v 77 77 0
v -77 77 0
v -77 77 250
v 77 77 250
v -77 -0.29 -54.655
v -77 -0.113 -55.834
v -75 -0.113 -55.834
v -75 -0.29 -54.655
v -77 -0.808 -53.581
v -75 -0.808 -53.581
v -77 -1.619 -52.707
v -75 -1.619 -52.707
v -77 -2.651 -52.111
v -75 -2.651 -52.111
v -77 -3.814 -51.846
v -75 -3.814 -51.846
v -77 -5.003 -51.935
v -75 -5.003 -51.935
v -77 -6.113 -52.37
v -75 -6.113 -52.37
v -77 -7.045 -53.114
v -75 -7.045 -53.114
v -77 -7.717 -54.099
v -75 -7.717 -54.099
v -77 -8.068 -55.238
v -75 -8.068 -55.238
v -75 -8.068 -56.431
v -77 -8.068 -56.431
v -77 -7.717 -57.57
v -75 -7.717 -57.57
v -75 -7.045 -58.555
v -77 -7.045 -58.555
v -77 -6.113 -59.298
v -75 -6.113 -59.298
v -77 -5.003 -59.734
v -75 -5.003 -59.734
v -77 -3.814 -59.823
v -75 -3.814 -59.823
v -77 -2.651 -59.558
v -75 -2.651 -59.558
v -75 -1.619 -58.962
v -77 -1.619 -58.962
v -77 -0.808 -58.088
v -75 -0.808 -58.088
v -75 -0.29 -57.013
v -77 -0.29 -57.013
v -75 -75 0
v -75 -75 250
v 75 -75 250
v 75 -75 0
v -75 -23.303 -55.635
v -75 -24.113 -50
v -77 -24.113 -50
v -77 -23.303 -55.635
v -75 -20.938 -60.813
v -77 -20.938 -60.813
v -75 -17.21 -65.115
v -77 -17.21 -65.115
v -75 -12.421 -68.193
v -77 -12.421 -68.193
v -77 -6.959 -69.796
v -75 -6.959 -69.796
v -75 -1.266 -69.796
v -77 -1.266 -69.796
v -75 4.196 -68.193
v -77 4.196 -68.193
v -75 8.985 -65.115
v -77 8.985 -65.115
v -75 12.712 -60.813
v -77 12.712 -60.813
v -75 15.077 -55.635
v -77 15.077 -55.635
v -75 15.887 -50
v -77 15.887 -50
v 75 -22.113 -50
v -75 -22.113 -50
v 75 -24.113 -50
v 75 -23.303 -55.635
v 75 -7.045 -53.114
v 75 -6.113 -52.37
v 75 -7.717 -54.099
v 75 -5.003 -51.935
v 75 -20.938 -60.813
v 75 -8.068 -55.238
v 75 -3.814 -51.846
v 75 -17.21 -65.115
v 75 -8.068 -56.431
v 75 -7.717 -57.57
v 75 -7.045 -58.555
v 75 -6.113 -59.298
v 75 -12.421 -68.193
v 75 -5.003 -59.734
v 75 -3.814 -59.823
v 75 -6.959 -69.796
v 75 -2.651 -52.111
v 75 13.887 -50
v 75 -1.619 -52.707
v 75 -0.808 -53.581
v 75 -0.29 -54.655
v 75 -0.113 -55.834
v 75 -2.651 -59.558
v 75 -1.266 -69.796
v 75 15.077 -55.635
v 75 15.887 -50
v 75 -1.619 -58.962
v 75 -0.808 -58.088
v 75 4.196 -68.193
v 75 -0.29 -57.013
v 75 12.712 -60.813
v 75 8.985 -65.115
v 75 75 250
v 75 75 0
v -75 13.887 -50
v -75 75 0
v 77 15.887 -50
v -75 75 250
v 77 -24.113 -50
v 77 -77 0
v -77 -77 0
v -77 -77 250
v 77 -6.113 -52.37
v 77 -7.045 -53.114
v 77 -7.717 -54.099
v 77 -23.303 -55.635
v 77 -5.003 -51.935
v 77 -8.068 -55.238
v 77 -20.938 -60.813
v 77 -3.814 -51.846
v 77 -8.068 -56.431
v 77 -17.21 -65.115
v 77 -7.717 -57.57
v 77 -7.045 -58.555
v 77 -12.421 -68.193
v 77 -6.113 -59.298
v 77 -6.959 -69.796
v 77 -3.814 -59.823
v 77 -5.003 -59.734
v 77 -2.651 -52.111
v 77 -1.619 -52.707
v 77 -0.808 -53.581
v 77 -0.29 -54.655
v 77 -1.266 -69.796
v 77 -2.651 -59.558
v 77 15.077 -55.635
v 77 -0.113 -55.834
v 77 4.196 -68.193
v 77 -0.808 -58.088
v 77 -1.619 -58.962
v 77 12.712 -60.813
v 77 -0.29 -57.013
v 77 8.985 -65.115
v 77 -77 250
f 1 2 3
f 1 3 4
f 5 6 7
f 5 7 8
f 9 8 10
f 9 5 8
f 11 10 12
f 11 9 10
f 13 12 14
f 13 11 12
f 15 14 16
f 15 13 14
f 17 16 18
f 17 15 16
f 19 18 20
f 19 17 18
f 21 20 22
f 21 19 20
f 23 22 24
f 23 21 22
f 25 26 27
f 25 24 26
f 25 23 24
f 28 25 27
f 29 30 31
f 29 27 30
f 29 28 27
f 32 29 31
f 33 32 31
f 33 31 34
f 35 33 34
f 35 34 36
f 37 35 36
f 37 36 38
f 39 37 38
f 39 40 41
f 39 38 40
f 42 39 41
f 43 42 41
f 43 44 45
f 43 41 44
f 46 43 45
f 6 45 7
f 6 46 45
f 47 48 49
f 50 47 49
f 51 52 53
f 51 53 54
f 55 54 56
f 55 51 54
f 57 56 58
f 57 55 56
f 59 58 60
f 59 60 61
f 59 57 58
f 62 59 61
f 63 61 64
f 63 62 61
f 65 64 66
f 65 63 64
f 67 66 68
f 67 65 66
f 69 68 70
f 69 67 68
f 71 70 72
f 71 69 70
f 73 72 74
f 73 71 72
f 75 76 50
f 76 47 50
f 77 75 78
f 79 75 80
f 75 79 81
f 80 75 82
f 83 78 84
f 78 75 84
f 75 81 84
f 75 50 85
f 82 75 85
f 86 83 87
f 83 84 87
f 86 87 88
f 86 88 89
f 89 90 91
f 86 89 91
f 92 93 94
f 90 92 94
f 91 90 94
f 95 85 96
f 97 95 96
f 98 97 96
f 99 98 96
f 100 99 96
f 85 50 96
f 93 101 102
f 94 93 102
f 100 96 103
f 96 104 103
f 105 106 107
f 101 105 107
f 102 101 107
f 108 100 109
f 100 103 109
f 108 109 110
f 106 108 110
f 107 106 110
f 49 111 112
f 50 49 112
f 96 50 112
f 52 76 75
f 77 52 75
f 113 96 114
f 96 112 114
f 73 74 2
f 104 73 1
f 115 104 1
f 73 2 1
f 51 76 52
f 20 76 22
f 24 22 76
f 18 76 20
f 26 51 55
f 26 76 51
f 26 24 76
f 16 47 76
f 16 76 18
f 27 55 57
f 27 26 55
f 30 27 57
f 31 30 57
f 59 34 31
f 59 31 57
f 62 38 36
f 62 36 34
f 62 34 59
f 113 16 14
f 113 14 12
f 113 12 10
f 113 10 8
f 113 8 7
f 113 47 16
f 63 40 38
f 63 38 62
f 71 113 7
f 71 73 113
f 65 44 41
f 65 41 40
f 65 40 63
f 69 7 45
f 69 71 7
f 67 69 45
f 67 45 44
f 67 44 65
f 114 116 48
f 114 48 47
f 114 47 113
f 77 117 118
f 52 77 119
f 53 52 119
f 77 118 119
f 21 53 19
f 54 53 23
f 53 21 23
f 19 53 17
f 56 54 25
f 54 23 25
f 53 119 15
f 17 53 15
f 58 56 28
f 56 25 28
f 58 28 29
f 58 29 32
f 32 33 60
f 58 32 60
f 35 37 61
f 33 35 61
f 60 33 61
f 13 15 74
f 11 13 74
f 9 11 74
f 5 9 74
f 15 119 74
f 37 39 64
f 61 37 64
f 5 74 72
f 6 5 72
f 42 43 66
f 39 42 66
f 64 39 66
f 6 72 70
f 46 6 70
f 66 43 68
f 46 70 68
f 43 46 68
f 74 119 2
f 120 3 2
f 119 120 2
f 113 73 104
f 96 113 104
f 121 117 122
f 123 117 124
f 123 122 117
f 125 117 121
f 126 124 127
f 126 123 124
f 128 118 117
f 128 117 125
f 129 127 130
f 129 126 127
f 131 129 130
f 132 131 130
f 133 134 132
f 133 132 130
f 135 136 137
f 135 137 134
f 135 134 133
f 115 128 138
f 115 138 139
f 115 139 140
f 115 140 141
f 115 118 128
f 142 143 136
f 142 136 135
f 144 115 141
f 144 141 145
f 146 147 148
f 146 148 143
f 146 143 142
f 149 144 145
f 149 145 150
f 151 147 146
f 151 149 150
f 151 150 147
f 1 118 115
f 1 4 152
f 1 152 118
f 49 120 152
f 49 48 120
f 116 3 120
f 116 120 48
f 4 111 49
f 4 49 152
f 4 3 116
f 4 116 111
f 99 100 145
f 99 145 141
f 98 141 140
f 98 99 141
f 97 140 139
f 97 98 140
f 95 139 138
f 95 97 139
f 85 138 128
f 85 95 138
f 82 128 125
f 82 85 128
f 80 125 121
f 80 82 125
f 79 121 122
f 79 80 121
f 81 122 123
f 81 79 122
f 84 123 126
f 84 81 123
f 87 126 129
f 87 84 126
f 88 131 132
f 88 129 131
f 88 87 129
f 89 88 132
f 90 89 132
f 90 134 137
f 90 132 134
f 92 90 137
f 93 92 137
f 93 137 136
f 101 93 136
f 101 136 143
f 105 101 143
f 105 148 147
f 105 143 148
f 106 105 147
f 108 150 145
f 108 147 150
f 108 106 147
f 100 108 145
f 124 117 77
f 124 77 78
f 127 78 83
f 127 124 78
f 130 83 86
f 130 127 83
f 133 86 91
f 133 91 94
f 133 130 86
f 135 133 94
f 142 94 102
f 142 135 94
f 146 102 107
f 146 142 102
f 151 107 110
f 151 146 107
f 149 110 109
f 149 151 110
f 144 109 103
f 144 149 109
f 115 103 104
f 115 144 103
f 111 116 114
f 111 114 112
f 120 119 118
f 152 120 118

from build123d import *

# Parameters (mm, degrees)
SKETCH1_W               = 154
SKETCH1_H               = 154
SKETCH1_W_2             = 150
SKETCH1_H_2             = 150
BOSS_EXTRUDE1_DEPTH     = 250
BOSS_EXTRUDE6_DEPTH     = 2
BOSS_EXTRUDE7_START     = -152
BOSS_EXTRUDE7_DEPTH     = 2
CUT_EXTRUDE1_DEPTH      = 304.553949235
CUT_EXTRUDE1_DEPTH_BACK = 304.553949235
SKETCH8_R               = 4


with BuildPart() as part:
    # Sketch1 → Boss-Extrude1 (new body)
    with BuildSketch(Plane.XY):
        Rectangle(SKETCH1_W, SKETCH1_H)
        Rectangle(SKETCH1_W_2, SKETCH1_H_2, mode=Mode.SUBTRACT)
    extrude(amount=BOSS_EXTRUDE1_DEPTH)

    # Sketch3 → Loft1 section 0
    with BuildSketch(Plane.XY.offset(-50)):
        with BuildLine():
            Line((-77, 15.887313735), (77, 15.887313735))
            Line((77, 15.887313735), (77, -24.112686265))
            Line((77, -24.112686265), (-77, -24.112686265))
            Line((-77, -24.112686265), (-77, 15.887313735))
        make_face()
    # Sketch2 → Loft1 section 1
    with BuildSketch(Plane(origin=(0, 0, 0), x_dir=(-1, 0, 0), z_dir=(0, 0, -1))):
        with BuildLine():
            Line((-77, 77), (77, 77))
            Line((77, 77), (77, -77))
            Line((77, -77), (-77, -77))
            Line((-77, -77), (-77, 77))
        make_face()
    loft()

    # Sketch3<3> → Cut-Loft1 section 0
    with BuildSketch(Plane.XY.offset(-50)):
        with BuildLine():
            Line((-75, 13.887313735), (-75, -22.112686265))
            Line((-75, -22.112686265), (75, -22.112686265))
            Line((75, -22.112686265), (75, 13.887313735))
            Line((75, 13.887313735), (-75, 13.887313735))
        make_face()
    # Sketch1<2> → Cut-Loft1 section 1
    with BuildSketch(Plane.XY):
        with BuildLine():
            Line((-75, 75), (75, 75))
            Line((75, 75), (75, -75))
            Line((75, -75), (-75, -75))
            Line((-75, -75), (-75, 75))
        make_face()
    loft(mode=Mode.SUBTRACT)

    # Sketch7 → Boss-Extrude6 (add)
    with BuildSketch(Plane(origin=(77, 0, 0), x_dir=(0, 0, -1), z_dir=(1, 0, 0))):
        with BuildLine():
            Line((50, 15.887313735), (50, -24.112686265))
            ThreePointArc((50, -24.112686265), (70, -4.112686265), (50, 15.887313735))
        make_face()
    extrude(amount=-BOSS_EXTRUDE6_DEPTH)

    # Sketch7<2> → Boss-Extrude7 (add)
    with BuildSketch(Plane(origin=(77, 0, 0), x_dir=(0, 0, -1), z_dir=(1, 0, 0)).offset(BOSS_EXTRUDE7_START)):
        with BuildLine():
            Line((50, 15.887313735), (50, -24.112686265))
            ThreePointArc((50, -24.112686265), (70, -4.112686265), (50, 15.887313735))
        make_face()
    extrude(amount=-BOSS_EXTRUDE7_DEPTH)

    # Sketch8 → Cut-Extrude1 (cut, two sides: drawn at the far end of the back side and taken through both)
    with BuildSketch(Plane(origin=(77, 0, 0), x_dir=(0, 0, -1), z_dir=(1, 0, 0)).offset(-CUT_EXTRUDE1_DEPTH_BACK)):
        with Locations(Location((55.834353072, -4.112686265, 0), (0, 0, 90))):
            Circle(SKETCH8_R)
    extrude(amount=CUT_EXTRUDE1_DEPTH + CUT_EXTRUDE1_DEPTH_BACK, mode=Mode.SUBTRACT)


solid = part.part
